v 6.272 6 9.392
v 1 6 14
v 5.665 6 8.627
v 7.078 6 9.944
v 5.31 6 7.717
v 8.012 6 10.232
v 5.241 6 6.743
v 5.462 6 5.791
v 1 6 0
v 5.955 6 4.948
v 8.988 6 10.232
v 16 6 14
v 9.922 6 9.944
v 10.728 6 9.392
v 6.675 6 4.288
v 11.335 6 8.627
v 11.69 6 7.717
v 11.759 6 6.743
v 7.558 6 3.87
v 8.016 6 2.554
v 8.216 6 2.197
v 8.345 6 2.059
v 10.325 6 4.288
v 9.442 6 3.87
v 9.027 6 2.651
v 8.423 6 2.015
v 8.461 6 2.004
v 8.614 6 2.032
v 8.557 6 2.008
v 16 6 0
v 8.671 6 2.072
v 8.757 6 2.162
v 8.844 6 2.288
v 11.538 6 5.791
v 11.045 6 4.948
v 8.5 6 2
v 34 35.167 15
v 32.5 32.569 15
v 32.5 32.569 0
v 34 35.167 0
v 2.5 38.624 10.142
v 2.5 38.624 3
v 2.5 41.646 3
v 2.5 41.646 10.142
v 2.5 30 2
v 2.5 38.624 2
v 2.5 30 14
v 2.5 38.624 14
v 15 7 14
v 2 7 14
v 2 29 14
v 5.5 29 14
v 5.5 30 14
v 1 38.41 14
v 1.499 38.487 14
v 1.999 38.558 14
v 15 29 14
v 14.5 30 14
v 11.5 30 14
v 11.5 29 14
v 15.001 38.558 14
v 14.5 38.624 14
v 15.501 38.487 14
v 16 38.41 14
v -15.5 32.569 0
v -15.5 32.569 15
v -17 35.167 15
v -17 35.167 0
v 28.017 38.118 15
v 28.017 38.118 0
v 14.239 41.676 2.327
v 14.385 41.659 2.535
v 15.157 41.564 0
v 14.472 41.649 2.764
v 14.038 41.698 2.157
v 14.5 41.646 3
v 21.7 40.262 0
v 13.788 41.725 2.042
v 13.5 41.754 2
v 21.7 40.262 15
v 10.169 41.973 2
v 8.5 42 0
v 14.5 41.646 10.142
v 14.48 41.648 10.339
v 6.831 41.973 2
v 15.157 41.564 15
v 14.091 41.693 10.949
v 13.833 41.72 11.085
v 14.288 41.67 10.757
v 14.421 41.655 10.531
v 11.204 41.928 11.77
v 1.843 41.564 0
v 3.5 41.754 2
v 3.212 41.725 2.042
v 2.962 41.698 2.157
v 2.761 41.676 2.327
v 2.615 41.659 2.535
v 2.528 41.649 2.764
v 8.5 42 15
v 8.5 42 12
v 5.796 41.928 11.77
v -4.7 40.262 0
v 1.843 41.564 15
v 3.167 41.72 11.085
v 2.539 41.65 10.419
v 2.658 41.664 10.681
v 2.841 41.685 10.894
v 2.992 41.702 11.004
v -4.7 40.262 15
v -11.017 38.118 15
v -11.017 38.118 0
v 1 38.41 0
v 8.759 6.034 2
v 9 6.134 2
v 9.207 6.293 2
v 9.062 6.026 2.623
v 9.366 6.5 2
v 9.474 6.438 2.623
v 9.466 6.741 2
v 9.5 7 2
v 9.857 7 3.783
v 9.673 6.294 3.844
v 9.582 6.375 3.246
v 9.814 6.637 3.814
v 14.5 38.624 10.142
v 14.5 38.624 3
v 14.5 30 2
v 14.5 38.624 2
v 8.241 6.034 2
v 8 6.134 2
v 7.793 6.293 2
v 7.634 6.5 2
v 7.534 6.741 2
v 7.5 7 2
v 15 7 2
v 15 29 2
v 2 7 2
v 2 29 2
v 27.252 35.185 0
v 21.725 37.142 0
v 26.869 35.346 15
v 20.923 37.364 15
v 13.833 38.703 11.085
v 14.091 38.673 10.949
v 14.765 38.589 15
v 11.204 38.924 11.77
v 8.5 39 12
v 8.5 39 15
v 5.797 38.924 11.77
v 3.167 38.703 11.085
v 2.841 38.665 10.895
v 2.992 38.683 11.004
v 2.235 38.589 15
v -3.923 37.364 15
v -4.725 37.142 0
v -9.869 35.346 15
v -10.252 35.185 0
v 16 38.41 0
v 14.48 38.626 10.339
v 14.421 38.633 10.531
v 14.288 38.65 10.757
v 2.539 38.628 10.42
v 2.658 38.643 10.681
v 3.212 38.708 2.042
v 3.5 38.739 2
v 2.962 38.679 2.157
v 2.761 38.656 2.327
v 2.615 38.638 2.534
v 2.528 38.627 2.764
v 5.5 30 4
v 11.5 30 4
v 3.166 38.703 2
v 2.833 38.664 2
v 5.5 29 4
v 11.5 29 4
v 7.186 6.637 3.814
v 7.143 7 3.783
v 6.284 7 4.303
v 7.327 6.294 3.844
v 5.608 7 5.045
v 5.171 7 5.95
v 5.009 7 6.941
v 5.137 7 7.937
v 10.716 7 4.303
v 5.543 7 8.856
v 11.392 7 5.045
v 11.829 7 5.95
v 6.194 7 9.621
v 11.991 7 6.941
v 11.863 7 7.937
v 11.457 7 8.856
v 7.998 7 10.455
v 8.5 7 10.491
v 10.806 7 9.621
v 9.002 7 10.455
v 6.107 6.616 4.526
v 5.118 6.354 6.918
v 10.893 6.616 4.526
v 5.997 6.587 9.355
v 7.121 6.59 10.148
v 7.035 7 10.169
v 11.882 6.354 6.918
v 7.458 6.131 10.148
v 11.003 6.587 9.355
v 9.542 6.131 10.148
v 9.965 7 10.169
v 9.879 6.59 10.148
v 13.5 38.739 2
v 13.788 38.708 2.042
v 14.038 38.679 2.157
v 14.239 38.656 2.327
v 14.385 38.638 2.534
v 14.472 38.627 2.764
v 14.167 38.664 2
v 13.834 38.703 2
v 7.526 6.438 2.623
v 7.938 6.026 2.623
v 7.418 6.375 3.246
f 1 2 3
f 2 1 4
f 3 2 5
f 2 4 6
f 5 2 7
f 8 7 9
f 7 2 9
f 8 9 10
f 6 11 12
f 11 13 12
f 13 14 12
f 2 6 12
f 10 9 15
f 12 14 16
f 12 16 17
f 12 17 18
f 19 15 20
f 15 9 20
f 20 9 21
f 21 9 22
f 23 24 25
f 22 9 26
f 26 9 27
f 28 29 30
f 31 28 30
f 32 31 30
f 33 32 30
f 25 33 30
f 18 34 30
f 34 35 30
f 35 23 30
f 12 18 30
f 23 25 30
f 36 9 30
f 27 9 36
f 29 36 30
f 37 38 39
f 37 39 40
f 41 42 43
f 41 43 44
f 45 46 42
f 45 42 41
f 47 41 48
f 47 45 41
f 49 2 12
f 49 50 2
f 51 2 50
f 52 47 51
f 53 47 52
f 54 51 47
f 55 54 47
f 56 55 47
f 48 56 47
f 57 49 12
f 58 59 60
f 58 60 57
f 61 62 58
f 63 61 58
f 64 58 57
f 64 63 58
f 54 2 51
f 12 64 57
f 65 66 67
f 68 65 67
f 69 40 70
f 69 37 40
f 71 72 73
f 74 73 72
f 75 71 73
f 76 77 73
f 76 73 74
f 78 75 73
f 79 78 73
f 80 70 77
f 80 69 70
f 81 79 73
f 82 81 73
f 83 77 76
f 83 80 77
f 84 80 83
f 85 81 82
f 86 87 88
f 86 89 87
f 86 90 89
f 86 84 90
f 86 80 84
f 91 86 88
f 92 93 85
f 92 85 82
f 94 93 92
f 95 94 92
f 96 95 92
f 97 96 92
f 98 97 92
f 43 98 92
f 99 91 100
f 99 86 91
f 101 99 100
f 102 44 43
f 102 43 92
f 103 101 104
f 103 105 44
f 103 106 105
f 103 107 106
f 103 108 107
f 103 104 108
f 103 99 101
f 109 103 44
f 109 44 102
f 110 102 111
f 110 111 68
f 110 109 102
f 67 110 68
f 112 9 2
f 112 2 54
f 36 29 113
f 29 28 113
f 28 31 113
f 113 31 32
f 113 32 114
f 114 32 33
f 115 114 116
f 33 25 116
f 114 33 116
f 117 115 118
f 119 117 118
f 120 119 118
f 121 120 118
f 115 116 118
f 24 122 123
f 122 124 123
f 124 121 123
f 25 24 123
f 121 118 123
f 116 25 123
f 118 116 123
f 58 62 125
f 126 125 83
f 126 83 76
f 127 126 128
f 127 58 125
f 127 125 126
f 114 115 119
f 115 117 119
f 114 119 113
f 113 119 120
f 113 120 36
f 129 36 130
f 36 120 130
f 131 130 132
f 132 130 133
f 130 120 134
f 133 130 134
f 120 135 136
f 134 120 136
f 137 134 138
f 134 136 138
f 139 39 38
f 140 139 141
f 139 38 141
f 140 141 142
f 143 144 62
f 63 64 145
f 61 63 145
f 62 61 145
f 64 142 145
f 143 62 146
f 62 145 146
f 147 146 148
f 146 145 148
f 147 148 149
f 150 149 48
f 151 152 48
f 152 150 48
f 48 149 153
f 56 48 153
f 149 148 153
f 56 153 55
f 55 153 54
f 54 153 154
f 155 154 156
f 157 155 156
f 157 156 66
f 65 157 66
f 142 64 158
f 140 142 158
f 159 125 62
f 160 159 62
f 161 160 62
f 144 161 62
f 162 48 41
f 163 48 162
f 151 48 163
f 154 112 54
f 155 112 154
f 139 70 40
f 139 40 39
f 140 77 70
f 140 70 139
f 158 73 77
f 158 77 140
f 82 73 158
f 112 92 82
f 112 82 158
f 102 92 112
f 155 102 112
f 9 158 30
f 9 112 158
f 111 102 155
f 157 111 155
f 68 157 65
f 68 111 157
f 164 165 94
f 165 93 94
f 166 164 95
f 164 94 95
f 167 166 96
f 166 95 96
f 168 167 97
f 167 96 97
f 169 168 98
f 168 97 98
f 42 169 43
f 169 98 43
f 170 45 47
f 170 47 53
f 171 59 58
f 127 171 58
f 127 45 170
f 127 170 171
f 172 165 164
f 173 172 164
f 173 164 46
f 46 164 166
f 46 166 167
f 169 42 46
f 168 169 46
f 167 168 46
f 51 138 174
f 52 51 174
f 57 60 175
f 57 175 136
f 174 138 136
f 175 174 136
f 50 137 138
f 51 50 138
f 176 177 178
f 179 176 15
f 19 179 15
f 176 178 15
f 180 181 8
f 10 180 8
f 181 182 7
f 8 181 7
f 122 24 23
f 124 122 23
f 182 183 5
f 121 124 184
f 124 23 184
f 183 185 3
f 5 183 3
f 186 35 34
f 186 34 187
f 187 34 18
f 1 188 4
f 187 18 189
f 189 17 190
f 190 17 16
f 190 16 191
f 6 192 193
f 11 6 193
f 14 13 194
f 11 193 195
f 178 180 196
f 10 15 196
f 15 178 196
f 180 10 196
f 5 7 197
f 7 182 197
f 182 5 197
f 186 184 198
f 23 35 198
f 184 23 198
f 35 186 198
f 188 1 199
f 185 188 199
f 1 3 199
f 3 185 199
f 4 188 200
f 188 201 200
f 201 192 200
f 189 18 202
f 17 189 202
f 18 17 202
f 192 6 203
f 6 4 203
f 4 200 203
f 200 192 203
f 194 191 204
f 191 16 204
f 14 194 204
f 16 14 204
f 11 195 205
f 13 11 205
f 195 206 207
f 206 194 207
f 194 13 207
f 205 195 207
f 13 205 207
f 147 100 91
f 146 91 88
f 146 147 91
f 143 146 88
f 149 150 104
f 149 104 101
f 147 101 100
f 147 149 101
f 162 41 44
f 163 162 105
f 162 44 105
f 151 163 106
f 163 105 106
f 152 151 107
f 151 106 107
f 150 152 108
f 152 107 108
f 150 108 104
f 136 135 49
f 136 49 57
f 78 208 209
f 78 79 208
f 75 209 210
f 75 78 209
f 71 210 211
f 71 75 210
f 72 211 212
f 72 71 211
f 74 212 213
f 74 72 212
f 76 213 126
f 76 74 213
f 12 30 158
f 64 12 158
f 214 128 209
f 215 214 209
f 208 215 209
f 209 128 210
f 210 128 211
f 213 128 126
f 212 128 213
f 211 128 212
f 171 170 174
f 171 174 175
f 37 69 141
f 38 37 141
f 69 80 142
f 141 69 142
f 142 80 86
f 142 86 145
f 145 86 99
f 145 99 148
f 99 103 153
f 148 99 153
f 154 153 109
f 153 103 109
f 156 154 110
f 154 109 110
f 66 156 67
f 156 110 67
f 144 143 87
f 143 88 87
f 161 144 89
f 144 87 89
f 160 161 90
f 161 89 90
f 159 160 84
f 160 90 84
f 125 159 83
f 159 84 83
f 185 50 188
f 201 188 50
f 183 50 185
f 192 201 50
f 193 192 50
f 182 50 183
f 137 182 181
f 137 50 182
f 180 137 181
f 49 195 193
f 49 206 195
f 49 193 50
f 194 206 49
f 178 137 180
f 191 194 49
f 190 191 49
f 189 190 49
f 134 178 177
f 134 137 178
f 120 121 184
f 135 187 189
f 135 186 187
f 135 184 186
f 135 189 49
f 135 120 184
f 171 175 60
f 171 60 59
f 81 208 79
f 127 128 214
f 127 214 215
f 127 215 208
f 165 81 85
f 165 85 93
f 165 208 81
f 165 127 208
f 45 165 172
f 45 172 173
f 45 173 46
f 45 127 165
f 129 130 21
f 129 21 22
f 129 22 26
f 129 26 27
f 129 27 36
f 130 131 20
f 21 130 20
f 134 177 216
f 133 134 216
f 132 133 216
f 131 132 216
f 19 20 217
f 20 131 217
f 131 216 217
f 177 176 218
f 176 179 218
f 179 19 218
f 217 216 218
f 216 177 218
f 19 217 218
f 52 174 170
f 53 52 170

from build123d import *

# Parameters (mm, degrees)
EXTRUDE_DEPTH               = 5
EXTRUDE001_DEPTH            = 5
THICKNESS_T                 = 1
BOX004_W                    = 5
BOX004_H                    = 5
BOX004_DEPTH                = 5
CYLINDER001_W               = 48
CYLINDER001_H               = 15
CYLINDER001_ANGLE           = 60
CYLINDER001_PLACEMENT_ANGLE = 60
CYLINDER_W                  = 51
CYLINDER_H                  = 15
CYLINDER_ANGLE              = 60
CYLINDER_PLACEMENT_ANGLE    = 60
BOX003_W                    = 6
BOX003_H                    = 4
BOX003_DEPTH                = 15
BOX002_W                    = 12
BOX002_H                    = 10
BOX002_DEPTH                = 15
BOX001_W                    = 13
BOX001_H                    = 22
BOX001_DEPTH                = 12
BOX_W                       = 15
BOX_H                       = 34
BOX_DEPTH                   = 14


with BuildPart() as extrude_body:
    # Common_cs → Extrude (new body)
    with BuildSketch(Plane(origin=(8.5, 45, 6), x_dir=(1, 0, 0), z_dir=(0, 1, 0))):
        with BuildLine():
            Line((5, 4), (-5, 4))
            Line((-5, 4), (-5, -3.142136))
            ThreePointArc((-5, -3.142136), (-2.53653, -3.783978), (0, -4))
            ThreePointArc((0, -4), (2.53653, -3.783978), (5, -3.142136))
            Line((5, -3.142136), (5, 4))
        make_face()
    extrude(amount=EXTRUDE_DEPTH)


with BuildPart() as extrude001:
    # Common_cs001 → Extrude001 (new body)
    with BuildSketch(Plane(origin=(8.5, 45, 6), x_dir=(1, 0, 0), z_dir=(0, 1, 0))):
        with BuildLine():
            Line((5, 4), (-5, 4))
            Line((-5, 4), (-5, -3.142136))
            ThreePointArc((-5, -3.142136), (-2.53653, -3.783978), (0, -4))
            ThreePointArc((0, -4), (2.53653, -3.783978), (5, -3.142136))
            Line((5, -3.142136), (5, 4))
        make_face()
    extrude(amount=EXTRUDE001_DEPTH)


with BuildPart() as fusion001:
    # Thickness base: copy of Extrude body
    add(extrude_body.part)

    # Thickness
    thickness_openings = [fusion001.faces().sort_by_distance(p)[0] for p in [
        (8.5, 50, 5.862901),
    ]]
    offset(amount=THICKNESS_T, openings=thickness_openings)

    # Fusion001: union Extrude body, Extrude001
    add(extrude_body.part)
    add(extrude001.part)


with BuildPart() as fusion001_1:
    # Fusion001 placement: moved
    add(fusion001.part.moved(Location((0, -7, 1))))


with BuildPart() as pin_opening:
    # Box004 → Box004 (new body)
    with BuildSketch(Plane(origin=(6, 38.5, 5), x_dir=(1, 0, 0), z_dir=(0, 0, 1))):
        with Locations((2.5, 2.5)):
            Rectangle(BOX004_W, BOX004_H)
    extrude(amount=BOX004_DEPTH)


with BuildPart() as bottle_wall001:
    # Cylinder001 → Cylinder001 (revolve)
    with BuildSketch(Plane.XZ):
        with Locations((24, 7.5)):
            Rectangle(CYLINDER001_W, CYLINDER001_H)
    revolve(axis=Axis((0, 0, 0), (0, 0, 1)), revolution_arc=CYLINDER001_ANGLE)


with BuildPart() as bottle_wall001_1:
    # Cylinder001 placement: moved
    add(bottle_wall001.part.moved(Location((8.5, -7, 0))).rotate(Axis((8.5, -7, 0), (0, 0, 1)), CYLINDER001_PLACEMENT_ANGLE))


with BuildPart() as cut005:
    # Cylinder → Cylinder (revolve)
    with BuildSketch(Plane.XZ):
        with Locations((25.5, 7.5)):
            Rectangle(CYLINDER_W, CYLINDER_H)
    revolve(axis=Axis((0, 0, 0), (0, 0, 1)), revolution_arc=CYLINDER_ANGLE)


with BuildPart() as cut005_1:
    # Cylinder placement: moved
    add(cut005.part.moved(Location((8.5, -7, 0))).rotate(Axis((8.5, -7, 0), (0, 0, 1)), CYLINDER_PLACEMENT_ANGLE))

    # Cut005: cut bottle_wall001
    add(bottle_wall001_1.part, mode=Mode.SUBTRACT)


with BuildPart() as cut005_2:
    # Cut005 placement: moved
    add(cut005_1.part.moved(Location((0, -2, 0))))


with BuildPart() as cone:
    # Cone → Cone (revolve)
    with BuildSketch(Plane(origin=(8.5, 7, 2), x_dir=(1, 0, 0), z_dir=(0, -1, 0))):
        Polygon((0, 0), (1, 0), (2, 5), (0, 5), align=None)
    revolve(axis=Axis((8.5, 7, 2), (0, 0, 1)))


with BuildPart() as pinhole:
    # Sphere → Sphere (revolve)
    with BuildSketch(Plane(origin=(8.5, 7.25, 7), x_dir=(1, 0, 0), z_dir=(0, -1, 0))):
        with BuildLine():
            ThreePointArc((0, -3.5), (3.5, 0), (0, 3.5))
            Line((0, 3.5), (0, -3.5))
        make_face()
    revolve(axis=Axis((8.5, 7.25, 7), (0, 0, 1)))


with BuildPart() as neck:
    # Box003 → Box003 (new body)
    with BuildSketch(Plane(origin=(5.5, 28, 4), x_dir=(1, 0, 0), z_dir=(0, 0, 1))):
        with Locations((3, 2)):
            Rectangle(BOX003_W, BOX003_H)
    extrude(amount=BOX003_DEPTH)


with BuildPart() as pullbay:
    # Box002 → Box002 (new body)
    with BuildSketch(Plane(origin=(2.5, 30, 2), x_dir=(1, 0, 0), z_dir=(0, 0, 1))):
        with Locations((6, 5)):
            Rectangle(BOX002_W, BOX002_H)
    extrude(amount=BOX002_DEPTH)


with BuildPart() as solenoidbay:
    # Box001 → Box001 (new body)
    with BuildSketch(Plane(origin=(2, 7, 2), x_dir=(1, 0, 0), z_dir=(0, 0, 1))):
        with Locations((6.5, 11)):
            Rectangle(BOX001_W, BOX001_H)
    extrude(amount=BOX001_DEPTH)


with BuildPart() as cut007:
    # Box → Box (new body)
    with BuildSketch(Plane(origin=(1, 6, 0), x_dir=(1, 0, 0), z_dir=(0, 0, 1))):
        with Locations((7.5, 17)):
            Rectangle(BOX_W, BOX_H)
    extrude(amount=BOX_DEPTH)

    # Cut: cut solenoidBay
    add(solenoidbay.part, mode=Mode.SUBTRACT)

    # Cut001: cut pullBay
    add(pullbay.part, mode=Mode.SUBTRACT)

    # Cut002: cut neck
    add(neck.part, mode=Mode.SUBTRACT)

    # Cut003: cut pinhole
    add(pinhole.part, mode=Mode.SUBTRACT)

    # Cut004: cut Cone
    add(cone.part, mode=Mode.SUBTRACT)

    # Fusion: union Cut005
    add(cut005_2.part)

    # Cut006: cut pin_opening
    add(pin_opening.part, mode=Mode.SUBTRACT)

    # Cut007: cut Fusion001
    add(fusion001_1.part, mode=Mode.SUBTRACT)


solid = cut007.part
